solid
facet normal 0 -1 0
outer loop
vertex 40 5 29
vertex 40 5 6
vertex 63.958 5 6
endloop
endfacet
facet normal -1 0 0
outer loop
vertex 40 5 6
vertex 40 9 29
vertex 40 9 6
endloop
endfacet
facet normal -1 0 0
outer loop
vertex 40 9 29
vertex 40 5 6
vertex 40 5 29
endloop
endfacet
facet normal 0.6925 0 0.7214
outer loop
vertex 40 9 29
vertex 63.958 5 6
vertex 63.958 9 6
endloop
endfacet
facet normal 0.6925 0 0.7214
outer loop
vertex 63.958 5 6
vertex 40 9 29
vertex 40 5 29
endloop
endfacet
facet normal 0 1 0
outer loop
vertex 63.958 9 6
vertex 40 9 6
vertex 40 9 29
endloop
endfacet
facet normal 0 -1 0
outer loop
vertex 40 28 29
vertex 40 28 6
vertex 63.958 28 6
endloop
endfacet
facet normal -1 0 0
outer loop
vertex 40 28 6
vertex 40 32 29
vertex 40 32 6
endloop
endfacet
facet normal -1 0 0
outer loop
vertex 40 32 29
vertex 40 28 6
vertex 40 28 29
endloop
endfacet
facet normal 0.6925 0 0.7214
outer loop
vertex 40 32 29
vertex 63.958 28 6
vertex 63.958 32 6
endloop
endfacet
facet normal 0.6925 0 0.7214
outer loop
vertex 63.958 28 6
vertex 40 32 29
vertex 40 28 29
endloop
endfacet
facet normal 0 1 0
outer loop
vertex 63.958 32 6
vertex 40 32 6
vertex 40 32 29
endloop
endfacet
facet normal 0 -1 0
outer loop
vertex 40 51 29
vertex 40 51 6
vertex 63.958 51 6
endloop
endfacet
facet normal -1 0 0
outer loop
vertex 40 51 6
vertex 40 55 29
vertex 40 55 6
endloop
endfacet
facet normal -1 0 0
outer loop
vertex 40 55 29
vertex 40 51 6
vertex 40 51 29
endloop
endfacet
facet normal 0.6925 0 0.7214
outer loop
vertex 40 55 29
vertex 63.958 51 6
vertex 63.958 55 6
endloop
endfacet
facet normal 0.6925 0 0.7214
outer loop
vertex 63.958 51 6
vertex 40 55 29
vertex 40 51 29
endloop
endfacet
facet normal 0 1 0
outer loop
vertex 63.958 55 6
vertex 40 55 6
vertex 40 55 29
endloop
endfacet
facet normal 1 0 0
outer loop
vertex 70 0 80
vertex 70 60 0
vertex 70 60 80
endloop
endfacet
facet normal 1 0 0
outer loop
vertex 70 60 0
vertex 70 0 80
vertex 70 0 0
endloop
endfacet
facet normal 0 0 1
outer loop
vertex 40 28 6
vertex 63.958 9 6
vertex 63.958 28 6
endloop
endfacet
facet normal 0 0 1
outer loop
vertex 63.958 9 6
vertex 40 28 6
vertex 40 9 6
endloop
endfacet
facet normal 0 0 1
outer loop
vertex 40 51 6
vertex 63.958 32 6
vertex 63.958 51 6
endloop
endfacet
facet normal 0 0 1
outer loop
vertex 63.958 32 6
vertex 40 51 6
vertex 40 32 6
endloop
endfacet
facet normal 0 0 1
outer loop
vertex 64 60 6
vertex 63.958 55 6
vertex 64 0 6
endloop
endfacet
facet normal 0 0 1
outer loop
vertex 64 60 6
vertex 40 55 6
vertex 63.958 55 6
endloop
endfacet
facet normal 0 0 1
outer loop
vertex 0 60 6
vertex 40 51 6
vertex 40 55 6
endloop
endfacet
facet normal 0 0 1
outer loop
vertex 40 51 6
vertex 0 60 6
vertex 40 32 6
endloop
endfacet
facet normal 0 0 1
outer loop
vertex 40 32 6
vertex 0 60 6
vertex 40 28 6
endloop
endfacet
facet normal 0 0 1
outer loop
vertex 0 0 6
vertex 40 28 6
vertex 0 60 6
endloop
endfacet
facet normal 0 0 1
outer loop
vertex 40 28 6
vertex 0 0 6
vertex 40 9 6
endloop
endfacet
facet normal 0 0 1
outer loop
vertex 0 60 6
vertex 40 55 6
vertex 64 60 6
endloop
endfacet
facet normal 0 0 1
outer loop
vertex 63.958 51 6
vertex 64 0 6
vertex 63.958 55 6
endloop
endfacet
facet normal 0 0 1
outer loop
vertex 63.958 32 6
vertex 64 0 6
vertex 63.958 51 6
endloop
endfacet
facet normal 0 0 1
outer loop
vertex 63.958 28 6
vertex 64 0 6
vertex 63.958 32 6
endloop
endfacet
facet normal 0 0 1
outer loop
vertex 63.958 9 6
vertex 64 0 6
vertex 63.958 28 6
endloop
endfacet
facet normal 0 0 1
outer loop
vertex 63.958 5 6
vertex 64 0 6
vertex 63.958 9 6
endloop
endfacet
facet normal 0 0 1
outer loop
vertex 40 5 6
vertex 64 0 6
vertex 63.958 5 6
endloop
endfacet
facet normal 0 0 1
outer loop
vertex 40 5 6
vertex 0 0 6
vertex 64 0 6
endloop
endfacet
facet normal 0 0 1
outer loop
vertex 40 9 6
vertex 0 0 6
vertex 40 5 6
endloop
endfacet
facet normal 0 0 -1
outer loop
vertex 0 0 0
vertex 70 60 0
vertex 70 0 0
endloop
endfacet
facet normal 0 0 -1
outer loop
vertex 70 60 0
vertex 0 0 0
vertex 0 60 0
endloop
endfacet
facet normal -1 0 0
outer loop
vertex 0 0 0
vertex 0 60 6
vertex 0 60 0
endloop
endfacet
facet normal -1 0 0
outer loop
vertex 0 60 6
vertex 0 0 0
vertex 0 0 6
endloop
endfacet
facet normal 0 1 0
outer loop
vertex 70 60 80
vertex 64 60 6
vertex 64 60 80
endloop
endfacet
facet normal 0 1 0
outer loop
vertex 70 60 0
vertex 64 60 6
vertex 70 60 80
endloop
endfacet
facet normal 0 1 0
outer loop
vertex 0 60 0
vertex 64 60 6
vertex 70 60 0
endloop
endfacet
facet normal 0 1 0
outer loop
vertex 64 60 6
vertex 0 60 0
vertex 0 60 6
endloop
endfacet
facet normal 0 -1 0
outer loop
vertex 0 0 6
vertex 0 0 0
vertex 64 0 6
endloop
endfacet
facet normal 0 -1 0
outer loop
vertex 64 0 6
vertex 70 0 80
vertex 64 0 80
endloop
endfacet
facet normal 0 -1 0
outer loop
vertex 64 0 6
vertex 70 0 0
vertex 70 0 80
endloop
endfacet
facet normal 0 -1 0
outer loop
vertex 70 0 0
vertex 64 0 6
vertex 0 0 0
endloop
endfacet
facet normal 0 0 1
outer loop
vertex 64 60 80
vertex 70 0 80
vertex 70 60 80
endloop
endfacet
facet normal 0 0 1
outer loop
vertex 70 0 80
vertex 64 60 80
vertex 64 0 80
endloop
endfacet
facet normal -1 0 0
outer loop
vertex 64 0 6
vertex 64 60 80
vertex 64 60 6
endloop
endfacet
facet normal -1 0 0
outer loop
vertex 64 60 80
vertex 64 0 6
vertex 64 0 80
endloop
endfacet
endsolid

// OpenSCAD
$fn = 32;

// ----------------------------------------------------------------------
// Rib bracket: 3-gusset L bracket
// ----------------------------------------------------------------------

// --- parameters (mm) ---
base_l = 70;              // foot length, X
base_w = 60;              // foot width, Y
base_t = 6;               // foot thickness
plate_t = 6;              // upright plate thickness
plate_h = 80;             // overall height
gus_l = 24;               // gusset leg along the foot
gus_h = 24;               // gusset height
gus_t = 4;                // gusset thickness
gus_edge = 5;             // gusset margin from the foot edge
n_gus = 3;                // gusset count

gus_pitch = (base_w - 2 * gus_edge - gus_t) / (n_gus - 1);  // gusset pitch

union() {
  cube([base_l, base_w, base_t]);
  translate([base_l - plate_t, 0, base_t - 1])
    cube([plate_t, base_w, plate_h - base_t + 1]);
  for (i = [0 : n_gus - 1])
    translate([base_l - plate_t - gus_l, gus_edge + i * gus_pitch, base_t - 1])
      rotate([-90, 0, 0])
        linear_extrude(height = gus_t)
          polygon(points = [[0, 0], [gus_l + 1, 0], [0, -gus_h]]);
}
